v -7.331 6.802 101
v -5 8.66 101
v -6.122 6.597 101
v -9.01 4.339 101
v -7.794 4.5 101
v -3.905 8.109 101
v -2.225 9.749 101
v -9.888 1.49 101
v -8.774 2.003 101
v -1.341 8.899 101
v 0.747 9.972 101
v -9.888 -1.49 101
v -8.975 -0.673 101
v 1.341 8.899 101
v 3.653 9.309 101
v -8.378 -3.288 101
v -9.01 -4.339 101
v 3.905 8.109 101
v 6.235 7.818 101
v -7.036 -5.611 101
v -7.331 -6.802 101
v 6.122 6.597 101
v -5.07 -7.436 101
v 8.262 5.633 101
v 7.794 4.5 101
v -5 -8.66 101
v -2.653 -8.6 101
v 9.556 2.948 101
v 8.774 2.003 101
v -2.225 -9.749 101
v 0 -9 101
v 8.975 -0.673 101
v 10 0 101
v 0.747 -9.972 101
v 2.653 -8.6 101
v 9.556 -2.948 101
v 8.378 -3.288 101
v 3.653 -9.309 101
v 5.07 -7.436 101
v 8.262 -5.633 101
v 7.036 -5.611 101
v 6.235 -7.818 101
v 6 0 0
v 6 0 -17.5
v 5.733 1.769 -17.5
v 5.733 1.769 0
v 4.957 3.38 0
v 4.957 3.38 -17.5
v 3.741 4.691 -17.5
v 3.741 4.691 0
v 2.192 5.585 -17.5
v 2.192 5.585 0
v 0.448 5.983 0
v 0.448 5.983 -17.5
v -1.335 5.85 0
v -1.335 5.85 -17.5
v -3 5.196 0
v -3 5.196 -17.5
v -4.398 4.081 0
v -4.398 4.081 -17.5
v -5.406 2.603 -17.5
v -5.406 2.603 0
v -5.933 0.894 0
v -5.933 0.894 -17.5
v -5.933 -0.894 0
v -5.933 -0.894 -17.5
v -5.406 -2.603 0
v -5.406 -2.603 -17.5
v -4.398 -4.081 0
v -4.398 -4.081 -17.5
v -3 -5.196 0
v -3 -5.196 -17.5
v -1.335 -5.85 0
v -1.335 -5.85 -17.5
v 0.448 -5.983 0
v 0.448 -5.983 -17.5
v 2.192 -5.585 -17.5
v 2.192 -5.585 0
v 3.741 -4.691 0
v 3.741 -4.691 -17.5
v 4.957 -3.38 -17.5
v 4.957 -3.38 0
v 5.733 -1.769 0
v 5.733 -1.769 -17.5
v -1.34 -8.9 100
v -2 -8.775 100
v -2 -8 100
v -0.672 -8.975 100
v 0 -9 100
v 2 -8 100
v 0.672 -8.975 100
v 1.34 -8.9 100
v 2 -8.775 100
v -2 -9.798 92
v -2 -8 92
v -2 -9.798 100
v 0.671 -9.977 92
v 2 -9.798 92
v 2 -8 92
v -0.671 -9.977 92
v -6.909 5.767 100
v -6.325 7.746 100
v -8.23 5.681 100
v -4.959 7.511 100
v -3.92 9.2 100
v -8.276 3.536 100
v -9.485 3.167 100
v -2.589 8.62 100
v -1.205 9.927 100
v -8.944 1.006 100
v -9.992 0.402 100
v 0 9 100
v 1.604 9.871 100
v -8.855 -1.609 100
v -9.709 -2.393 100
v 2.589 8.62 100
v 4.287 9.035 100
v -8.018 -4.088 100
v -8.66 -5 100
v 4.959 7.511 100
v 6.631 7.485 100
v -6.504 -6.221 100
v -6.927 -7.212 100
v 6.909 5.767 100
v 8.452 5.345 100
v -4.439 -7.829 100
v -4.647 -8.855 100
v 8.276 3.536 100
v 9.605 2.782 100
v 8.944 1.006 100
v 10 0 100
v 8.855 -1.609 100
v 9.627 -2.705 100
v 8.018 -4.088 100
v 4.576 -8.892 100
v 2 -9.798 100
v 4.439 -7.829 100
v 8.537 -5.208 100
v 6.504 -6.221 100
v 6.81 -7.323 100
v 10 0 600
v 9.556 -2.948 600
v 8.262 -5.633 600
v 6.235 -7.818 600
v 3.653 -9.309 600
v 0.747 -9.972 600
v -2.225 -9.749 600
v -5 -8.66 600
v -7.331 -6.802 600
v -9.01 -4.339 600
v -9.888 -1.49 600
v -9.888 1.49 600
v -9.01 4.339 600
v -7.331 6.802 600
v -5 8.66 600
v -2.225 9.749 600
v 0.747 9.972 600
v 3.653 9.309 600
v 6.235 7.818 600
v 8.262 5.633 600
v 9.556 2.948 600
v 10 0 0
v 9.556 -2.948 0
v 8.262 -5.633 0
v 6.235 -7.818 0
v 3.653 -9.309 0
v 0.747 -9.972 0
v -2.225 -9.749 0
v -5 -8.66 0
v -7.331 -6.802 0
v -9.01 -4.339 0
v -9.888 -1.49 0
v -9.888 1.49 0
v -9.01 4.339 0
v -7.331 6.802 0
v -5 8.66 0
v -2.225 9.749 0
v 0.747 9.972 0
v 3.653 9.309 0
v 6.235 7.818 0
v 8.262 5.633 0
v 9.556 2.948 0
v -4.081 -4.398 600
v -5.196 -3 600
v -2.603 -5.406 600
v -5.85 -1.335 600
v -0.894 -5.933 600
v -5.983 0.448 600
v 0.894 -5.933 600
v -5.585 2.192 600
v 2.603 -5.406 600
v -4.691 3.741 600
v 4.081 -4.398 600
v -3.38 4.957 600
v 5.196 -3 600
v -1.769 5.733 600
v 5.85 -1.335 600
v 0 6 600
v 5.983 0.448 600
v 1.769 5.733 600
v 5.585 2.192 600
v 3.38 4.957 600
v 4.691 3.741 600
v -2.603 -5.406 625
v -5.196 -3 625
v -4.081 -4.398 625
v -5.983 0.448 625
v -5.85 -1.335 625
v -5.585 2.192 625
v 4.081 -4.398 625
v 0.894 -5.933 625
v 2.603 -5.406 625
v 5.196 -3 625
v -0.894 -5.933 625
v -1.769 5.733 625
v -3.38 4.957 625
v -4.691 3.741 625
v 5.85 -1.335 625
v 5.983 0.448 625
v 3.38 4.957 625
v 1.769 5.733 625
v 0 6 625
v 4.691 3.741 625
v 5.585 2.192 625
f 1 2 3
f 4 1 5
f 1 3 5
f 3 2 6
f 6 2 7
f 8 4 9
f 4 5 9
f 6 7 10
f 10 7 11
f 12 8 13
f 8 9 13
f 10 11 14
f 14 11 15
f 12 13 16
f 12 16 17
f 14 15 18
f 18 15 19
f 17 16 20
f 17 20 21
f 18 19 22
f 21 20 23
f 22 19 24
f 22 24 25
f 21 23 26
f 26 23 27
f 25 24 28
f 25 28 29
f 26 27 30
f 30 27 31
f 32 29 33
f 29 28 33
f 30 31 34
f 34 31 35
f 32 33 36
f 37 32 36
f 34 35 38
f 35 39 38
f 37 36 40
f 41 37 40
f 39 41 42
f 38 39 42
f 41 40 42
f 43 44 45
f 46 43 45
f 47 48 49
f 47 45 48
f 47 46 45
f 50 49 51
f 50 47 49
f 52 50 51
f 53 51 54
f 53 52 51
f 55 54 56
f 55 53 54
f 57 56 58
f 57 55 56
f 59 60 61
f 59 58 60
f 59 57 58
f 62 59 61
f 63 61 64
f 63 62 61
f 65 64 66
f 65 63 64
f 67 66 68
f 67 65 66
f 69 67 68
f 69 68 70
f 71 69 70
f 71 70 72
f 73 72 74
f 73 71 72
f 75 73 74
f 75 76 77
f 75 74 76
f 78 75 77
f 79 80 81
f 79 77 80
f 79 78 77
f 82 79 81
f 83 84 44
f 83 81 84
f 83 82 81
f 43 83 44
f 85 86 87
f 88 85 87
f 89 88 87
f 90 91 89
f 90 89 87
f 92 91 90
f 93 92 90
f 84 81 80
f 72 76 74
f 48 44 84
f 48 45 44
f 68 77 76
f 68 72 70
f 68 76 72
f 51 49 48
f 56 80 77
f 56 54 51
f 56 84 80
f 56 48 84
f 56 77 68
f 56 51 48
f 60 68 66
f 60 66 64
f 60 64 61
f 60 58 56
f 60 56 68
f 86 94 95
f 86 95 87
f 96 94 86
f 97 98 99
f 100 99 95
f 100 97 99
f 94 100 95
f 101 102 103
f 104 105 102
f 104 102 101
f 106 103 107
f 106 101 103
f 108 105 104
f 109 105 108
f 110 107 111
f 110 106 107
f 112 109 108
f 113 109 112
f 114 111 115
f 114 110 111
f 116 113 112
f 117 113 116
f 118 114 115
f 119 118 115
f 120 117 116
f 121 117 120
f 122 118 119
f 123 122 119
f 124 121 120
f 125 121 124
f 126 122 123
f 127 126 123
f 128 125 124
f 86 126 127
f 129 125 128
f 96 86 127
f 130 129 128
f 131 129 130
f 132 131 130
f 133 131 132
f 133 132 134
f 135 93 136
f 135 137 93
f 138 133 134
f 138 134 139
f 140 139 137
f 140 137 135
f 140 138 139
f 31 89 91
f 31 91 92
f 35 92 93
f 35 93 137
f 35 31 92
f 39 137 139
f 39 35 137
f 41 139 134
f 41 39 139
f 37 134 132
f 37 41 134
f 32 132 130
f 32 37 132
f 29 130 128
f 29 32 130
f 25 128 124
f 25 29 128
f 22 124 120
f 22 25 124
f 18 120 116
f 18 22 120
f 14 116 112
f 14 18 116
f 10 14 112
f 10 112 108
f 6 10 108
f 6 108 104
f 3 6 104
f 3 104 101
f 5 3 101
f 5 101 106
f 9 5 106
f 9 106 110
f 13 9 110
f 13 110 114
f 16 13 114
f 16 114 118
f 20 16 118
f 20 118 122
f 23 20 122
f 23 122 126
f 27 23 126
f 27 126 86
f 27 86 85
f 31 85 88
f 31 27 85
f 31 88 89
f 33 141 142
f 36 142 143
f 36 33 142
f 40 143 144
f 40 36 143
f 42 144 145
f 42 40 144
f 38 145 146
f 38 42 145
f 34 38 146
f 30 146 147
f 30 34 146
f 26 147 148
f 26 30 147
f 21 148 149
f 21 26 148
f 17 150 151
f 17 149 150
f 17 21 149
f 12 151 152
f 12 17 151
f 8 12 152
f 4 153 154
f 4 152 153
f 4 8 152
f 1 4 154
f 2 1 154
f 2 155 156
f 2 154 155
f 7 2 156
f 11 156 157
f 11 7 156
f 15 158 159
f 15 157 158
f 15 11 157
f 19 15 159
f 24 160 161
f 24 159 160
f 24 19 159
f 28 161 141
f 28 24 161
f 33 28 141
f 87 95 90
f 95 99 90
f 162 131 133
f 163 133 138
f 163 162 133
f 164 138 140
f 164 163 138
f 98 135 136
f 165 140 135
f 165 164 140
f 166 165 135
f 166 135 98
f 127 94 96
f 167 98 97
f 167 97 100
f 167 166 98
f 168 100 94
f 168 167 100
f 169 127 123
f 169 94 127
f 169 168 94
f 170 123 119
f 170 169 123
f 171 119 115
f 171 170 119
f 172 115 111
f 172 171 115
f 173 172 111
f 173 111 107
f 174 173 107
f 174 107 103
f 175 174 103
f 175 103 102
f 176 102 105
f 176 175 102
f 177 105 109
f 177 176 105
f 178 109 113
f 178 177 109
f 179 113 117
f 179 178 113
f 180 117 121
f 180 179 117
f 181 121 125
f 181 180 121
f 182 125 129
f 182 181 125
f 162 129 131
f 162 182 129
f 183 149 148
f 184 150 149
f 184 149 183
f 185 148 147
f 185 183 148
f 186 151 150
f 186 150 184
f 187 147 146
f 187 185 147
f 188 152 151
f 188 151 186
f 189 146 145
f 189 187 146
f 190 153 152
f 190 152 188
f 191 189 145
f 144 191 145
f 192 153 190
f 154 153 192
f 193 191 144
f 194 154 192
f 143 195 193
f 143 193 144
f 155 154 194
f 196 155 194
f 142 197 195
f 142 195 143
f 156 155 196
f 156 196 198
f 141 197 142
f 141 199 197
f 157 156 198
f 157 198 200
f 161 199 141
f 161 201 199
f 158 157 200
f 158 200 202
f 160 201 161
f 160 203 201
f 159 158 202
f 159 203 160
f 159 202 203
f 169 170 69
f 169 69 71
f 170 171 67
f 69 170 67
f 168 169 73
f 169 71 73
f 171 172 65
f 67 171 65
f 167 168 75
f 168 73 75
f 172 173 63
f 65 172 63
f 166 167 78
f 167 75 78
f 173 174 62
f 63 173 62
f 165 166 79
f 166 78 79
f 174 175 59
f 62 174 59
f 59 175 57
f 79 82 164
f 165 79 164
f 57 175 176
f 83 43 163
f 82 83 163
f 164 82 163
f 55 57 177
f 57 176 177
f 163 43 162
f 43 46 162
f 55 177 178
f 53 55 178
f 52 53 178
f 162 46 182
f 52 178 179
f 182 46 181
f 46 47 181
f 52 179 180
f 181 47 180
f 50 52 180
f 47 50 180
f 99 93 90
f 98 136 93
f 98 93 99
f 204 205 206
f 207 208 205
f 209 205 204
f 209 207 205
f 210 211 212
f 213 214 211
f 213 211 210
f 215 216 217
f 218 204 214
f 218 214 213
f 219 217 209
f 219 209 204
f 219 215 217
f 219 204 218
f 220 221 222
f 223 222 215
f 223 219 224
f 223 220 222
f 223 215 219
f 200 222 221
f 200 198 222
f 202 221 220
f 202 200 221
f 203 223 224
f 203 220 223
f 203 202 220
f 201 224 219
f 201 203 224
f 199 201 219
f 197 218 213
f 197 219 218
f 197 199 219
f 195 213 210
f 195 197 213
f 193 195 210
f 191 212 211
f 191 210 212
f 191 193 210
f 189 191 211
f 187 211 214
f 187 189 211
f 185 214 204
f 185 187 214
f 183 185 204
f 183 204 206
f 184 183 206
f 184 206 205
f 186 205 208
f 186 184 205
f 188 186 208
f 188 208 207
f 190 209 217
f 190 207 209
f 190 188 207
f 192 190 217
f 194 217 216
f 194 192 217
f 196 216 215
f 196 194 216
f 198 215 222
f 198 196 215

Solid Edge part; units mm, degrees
sketch "Sketch1" plane through (0, 0, 0) normal (0, 0, 1) x (1, 0, 0)
  circle A0 centre (0, 0) radius 10
extrude "Protrusion1" add sketch "Sketch1" along normal blind 600
sketch "Sketch2" plane through (0, 0, 0) normal (0, 0, -1) x (1, 0, 0)
  circle A0 centre (0, 0) radius 6
extrude "ExtrudedProtrusion_2" add sketch "Sketch2" along normal mid plane 35
cosmetic_thread "Thread1" size "Tr 12 x 3"
sketch "Sketch3" plane through (0, 0, 600) normal (0, 0, 1) x (0, 1, 0)
  circle A0 centre (0, 0) radius 6
extrude "ExtrudedProtrusion_3" add sketch "Sketch3" along normal blind 25
cosmetic_thread "Thread2" size "M12"
sketch "Sketch4" plane through (0, -10, 250) normal (0, -1, 0) x (0, 0, -1)
  line L0 (158, -2) -> (150, -2)
  line L1 (150, -2) -> (150, 2)
  line L2 (150, 2) -> (158, 2)
  line L3 (158, 2) -> (158, -2)
  dimension "D1" = 100
  dimension "D2" = 8
  dimension "D3" = 4
extrude "ExtrudedCutout_5" cut sketch "Sketch4" against normal blind 2
sketch "Sketch5" plane through (0, 0, 0) normal (1, 0, 0) x (0, 1, 0)
  line L0 (-10, 100) -> (-9, 100)
  line L1 (-9, 100) -> (-9, 101)
  line L2 (-9, 101) -> (-10, 101)
  line L3 (-10, 101) -> (-10, 100)
  dimension "D1" = 1
  dimension "D2" = 1
revolve "RevolvedCutout1" cut sketch "Sketch5" angle 360 about axis through (0, 0, -57) along (0, 0, 1)
properties material "Steel"
